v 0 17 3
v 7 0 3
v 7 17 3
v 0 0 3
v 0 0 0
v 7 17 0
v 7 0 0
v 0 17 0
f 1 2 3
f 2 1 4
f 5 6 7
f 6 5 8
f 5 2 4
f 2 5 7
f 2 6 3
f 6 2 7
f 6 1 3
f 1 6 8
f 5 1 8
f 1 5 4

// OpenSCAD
// Generated by SolidPython 1.0.1 on 2020-07-29 00:46:55


cube(size = [7, 17, 3]);
/***********************************************
*********      SolidPython code:      **********
************************************************
 
# import packages: SolidPython
from solid import *
from solid.utils import *
from itertools import chain, combinations, permutations


class Resize:

    def __init__(self, scad_file):
        self.scad_file = scad_file
        #self.scad_file = import_scad(scad_file)
        # cone/cylinder param:
        self.r1 = 0
        self.r2 = 0
        self.h = 0
        # rectangular prism param:
        self.w = 0
        self.l = 0
        # ellipse param:
        self.r = 0

    # import OpenScad code (file name corresponds to shape)


    # classify shape + parameters
    def assign(self, param1, param2, param3):
        if self.scad_file == 'cone.scad':
            self.r1 = param1
            self.r2 = param2
            self.h = param3
        elif self.scad_file == 'cylinder.scad':
            self.r1 = param1
            self.r2 = param2
            self.h = param3
        elif self.scad_file == 'rectangularPrism.scad':
            self.h = param1
            self.l = param2
            self.w = param3
        else:
            self.r = param1
            self.h = param2

    # resize parameters
    def iterate(self):
        x = range(3, 20, 2)
        i = 1
        if self.scad_file == 'cone.scad':
            tempList = list(permutations(x, 2))
            for temp in tempList:
                param1 = temp[0]
                param2 = temp[1]
                filepath = 'produced_scad_files/' + 'cone' + str(param1) + '_' + str(param2) + '_' + '.scad'
                scad_render_to_file(cylinder(h=param1, r1=param2, r2=0), filepath)

        elif self.scad_file == 'cylinder.scad':
            tempList = list(permutations(x, 3))
            for temp in tempList:
                param1 = temp[0]
                param2 = temp[1]
                filepath = 'produced_scad_files/' + 'cylinder' + str(param1) + '_' + str(param2) + '_' + '.scad'
                scad_render_to_file(cylinder(h=param1, r1=param2, r2=param2), filepath)

        elif self.scad_file == 'rectangularPrism.scad':
            tempList = list(permutations(x, 3))
            for temp in tempList:
                param1 = temp[0]
                param2 = temp[1]
                param3 = temp[2]
                filepath = 'produced_scad_files/' + 'rectangularPrism' + str(param1) + '_' + str(param2) + '_' + str(
                    param3) + '.scad'
                scad_render_to_file(cube(size=(param1, param2, param3)), filepath)

        elif self.scad_file == 'ellipse.scad':
            tempList = list(permutations(x, 4))
            for temp in tempList:
                param1 = temp[0]
                param2 = temp[1]
                param3 = temp[2]
                param4 = temp[3]
                filepath = 'produced_scad_files/' + 'ellipse' + str(param1) + '_' + str(param2) + '_' + str(param3) + '_' + str(param4) + '.scad'
                scad_render_to_file(scale([param1, param2, param3])(sphere(r=param4)), filepath)

    def render_to_scadfile(self):
        scad_render_to_file(scad, 'example.scad') 
 
************************************************/
